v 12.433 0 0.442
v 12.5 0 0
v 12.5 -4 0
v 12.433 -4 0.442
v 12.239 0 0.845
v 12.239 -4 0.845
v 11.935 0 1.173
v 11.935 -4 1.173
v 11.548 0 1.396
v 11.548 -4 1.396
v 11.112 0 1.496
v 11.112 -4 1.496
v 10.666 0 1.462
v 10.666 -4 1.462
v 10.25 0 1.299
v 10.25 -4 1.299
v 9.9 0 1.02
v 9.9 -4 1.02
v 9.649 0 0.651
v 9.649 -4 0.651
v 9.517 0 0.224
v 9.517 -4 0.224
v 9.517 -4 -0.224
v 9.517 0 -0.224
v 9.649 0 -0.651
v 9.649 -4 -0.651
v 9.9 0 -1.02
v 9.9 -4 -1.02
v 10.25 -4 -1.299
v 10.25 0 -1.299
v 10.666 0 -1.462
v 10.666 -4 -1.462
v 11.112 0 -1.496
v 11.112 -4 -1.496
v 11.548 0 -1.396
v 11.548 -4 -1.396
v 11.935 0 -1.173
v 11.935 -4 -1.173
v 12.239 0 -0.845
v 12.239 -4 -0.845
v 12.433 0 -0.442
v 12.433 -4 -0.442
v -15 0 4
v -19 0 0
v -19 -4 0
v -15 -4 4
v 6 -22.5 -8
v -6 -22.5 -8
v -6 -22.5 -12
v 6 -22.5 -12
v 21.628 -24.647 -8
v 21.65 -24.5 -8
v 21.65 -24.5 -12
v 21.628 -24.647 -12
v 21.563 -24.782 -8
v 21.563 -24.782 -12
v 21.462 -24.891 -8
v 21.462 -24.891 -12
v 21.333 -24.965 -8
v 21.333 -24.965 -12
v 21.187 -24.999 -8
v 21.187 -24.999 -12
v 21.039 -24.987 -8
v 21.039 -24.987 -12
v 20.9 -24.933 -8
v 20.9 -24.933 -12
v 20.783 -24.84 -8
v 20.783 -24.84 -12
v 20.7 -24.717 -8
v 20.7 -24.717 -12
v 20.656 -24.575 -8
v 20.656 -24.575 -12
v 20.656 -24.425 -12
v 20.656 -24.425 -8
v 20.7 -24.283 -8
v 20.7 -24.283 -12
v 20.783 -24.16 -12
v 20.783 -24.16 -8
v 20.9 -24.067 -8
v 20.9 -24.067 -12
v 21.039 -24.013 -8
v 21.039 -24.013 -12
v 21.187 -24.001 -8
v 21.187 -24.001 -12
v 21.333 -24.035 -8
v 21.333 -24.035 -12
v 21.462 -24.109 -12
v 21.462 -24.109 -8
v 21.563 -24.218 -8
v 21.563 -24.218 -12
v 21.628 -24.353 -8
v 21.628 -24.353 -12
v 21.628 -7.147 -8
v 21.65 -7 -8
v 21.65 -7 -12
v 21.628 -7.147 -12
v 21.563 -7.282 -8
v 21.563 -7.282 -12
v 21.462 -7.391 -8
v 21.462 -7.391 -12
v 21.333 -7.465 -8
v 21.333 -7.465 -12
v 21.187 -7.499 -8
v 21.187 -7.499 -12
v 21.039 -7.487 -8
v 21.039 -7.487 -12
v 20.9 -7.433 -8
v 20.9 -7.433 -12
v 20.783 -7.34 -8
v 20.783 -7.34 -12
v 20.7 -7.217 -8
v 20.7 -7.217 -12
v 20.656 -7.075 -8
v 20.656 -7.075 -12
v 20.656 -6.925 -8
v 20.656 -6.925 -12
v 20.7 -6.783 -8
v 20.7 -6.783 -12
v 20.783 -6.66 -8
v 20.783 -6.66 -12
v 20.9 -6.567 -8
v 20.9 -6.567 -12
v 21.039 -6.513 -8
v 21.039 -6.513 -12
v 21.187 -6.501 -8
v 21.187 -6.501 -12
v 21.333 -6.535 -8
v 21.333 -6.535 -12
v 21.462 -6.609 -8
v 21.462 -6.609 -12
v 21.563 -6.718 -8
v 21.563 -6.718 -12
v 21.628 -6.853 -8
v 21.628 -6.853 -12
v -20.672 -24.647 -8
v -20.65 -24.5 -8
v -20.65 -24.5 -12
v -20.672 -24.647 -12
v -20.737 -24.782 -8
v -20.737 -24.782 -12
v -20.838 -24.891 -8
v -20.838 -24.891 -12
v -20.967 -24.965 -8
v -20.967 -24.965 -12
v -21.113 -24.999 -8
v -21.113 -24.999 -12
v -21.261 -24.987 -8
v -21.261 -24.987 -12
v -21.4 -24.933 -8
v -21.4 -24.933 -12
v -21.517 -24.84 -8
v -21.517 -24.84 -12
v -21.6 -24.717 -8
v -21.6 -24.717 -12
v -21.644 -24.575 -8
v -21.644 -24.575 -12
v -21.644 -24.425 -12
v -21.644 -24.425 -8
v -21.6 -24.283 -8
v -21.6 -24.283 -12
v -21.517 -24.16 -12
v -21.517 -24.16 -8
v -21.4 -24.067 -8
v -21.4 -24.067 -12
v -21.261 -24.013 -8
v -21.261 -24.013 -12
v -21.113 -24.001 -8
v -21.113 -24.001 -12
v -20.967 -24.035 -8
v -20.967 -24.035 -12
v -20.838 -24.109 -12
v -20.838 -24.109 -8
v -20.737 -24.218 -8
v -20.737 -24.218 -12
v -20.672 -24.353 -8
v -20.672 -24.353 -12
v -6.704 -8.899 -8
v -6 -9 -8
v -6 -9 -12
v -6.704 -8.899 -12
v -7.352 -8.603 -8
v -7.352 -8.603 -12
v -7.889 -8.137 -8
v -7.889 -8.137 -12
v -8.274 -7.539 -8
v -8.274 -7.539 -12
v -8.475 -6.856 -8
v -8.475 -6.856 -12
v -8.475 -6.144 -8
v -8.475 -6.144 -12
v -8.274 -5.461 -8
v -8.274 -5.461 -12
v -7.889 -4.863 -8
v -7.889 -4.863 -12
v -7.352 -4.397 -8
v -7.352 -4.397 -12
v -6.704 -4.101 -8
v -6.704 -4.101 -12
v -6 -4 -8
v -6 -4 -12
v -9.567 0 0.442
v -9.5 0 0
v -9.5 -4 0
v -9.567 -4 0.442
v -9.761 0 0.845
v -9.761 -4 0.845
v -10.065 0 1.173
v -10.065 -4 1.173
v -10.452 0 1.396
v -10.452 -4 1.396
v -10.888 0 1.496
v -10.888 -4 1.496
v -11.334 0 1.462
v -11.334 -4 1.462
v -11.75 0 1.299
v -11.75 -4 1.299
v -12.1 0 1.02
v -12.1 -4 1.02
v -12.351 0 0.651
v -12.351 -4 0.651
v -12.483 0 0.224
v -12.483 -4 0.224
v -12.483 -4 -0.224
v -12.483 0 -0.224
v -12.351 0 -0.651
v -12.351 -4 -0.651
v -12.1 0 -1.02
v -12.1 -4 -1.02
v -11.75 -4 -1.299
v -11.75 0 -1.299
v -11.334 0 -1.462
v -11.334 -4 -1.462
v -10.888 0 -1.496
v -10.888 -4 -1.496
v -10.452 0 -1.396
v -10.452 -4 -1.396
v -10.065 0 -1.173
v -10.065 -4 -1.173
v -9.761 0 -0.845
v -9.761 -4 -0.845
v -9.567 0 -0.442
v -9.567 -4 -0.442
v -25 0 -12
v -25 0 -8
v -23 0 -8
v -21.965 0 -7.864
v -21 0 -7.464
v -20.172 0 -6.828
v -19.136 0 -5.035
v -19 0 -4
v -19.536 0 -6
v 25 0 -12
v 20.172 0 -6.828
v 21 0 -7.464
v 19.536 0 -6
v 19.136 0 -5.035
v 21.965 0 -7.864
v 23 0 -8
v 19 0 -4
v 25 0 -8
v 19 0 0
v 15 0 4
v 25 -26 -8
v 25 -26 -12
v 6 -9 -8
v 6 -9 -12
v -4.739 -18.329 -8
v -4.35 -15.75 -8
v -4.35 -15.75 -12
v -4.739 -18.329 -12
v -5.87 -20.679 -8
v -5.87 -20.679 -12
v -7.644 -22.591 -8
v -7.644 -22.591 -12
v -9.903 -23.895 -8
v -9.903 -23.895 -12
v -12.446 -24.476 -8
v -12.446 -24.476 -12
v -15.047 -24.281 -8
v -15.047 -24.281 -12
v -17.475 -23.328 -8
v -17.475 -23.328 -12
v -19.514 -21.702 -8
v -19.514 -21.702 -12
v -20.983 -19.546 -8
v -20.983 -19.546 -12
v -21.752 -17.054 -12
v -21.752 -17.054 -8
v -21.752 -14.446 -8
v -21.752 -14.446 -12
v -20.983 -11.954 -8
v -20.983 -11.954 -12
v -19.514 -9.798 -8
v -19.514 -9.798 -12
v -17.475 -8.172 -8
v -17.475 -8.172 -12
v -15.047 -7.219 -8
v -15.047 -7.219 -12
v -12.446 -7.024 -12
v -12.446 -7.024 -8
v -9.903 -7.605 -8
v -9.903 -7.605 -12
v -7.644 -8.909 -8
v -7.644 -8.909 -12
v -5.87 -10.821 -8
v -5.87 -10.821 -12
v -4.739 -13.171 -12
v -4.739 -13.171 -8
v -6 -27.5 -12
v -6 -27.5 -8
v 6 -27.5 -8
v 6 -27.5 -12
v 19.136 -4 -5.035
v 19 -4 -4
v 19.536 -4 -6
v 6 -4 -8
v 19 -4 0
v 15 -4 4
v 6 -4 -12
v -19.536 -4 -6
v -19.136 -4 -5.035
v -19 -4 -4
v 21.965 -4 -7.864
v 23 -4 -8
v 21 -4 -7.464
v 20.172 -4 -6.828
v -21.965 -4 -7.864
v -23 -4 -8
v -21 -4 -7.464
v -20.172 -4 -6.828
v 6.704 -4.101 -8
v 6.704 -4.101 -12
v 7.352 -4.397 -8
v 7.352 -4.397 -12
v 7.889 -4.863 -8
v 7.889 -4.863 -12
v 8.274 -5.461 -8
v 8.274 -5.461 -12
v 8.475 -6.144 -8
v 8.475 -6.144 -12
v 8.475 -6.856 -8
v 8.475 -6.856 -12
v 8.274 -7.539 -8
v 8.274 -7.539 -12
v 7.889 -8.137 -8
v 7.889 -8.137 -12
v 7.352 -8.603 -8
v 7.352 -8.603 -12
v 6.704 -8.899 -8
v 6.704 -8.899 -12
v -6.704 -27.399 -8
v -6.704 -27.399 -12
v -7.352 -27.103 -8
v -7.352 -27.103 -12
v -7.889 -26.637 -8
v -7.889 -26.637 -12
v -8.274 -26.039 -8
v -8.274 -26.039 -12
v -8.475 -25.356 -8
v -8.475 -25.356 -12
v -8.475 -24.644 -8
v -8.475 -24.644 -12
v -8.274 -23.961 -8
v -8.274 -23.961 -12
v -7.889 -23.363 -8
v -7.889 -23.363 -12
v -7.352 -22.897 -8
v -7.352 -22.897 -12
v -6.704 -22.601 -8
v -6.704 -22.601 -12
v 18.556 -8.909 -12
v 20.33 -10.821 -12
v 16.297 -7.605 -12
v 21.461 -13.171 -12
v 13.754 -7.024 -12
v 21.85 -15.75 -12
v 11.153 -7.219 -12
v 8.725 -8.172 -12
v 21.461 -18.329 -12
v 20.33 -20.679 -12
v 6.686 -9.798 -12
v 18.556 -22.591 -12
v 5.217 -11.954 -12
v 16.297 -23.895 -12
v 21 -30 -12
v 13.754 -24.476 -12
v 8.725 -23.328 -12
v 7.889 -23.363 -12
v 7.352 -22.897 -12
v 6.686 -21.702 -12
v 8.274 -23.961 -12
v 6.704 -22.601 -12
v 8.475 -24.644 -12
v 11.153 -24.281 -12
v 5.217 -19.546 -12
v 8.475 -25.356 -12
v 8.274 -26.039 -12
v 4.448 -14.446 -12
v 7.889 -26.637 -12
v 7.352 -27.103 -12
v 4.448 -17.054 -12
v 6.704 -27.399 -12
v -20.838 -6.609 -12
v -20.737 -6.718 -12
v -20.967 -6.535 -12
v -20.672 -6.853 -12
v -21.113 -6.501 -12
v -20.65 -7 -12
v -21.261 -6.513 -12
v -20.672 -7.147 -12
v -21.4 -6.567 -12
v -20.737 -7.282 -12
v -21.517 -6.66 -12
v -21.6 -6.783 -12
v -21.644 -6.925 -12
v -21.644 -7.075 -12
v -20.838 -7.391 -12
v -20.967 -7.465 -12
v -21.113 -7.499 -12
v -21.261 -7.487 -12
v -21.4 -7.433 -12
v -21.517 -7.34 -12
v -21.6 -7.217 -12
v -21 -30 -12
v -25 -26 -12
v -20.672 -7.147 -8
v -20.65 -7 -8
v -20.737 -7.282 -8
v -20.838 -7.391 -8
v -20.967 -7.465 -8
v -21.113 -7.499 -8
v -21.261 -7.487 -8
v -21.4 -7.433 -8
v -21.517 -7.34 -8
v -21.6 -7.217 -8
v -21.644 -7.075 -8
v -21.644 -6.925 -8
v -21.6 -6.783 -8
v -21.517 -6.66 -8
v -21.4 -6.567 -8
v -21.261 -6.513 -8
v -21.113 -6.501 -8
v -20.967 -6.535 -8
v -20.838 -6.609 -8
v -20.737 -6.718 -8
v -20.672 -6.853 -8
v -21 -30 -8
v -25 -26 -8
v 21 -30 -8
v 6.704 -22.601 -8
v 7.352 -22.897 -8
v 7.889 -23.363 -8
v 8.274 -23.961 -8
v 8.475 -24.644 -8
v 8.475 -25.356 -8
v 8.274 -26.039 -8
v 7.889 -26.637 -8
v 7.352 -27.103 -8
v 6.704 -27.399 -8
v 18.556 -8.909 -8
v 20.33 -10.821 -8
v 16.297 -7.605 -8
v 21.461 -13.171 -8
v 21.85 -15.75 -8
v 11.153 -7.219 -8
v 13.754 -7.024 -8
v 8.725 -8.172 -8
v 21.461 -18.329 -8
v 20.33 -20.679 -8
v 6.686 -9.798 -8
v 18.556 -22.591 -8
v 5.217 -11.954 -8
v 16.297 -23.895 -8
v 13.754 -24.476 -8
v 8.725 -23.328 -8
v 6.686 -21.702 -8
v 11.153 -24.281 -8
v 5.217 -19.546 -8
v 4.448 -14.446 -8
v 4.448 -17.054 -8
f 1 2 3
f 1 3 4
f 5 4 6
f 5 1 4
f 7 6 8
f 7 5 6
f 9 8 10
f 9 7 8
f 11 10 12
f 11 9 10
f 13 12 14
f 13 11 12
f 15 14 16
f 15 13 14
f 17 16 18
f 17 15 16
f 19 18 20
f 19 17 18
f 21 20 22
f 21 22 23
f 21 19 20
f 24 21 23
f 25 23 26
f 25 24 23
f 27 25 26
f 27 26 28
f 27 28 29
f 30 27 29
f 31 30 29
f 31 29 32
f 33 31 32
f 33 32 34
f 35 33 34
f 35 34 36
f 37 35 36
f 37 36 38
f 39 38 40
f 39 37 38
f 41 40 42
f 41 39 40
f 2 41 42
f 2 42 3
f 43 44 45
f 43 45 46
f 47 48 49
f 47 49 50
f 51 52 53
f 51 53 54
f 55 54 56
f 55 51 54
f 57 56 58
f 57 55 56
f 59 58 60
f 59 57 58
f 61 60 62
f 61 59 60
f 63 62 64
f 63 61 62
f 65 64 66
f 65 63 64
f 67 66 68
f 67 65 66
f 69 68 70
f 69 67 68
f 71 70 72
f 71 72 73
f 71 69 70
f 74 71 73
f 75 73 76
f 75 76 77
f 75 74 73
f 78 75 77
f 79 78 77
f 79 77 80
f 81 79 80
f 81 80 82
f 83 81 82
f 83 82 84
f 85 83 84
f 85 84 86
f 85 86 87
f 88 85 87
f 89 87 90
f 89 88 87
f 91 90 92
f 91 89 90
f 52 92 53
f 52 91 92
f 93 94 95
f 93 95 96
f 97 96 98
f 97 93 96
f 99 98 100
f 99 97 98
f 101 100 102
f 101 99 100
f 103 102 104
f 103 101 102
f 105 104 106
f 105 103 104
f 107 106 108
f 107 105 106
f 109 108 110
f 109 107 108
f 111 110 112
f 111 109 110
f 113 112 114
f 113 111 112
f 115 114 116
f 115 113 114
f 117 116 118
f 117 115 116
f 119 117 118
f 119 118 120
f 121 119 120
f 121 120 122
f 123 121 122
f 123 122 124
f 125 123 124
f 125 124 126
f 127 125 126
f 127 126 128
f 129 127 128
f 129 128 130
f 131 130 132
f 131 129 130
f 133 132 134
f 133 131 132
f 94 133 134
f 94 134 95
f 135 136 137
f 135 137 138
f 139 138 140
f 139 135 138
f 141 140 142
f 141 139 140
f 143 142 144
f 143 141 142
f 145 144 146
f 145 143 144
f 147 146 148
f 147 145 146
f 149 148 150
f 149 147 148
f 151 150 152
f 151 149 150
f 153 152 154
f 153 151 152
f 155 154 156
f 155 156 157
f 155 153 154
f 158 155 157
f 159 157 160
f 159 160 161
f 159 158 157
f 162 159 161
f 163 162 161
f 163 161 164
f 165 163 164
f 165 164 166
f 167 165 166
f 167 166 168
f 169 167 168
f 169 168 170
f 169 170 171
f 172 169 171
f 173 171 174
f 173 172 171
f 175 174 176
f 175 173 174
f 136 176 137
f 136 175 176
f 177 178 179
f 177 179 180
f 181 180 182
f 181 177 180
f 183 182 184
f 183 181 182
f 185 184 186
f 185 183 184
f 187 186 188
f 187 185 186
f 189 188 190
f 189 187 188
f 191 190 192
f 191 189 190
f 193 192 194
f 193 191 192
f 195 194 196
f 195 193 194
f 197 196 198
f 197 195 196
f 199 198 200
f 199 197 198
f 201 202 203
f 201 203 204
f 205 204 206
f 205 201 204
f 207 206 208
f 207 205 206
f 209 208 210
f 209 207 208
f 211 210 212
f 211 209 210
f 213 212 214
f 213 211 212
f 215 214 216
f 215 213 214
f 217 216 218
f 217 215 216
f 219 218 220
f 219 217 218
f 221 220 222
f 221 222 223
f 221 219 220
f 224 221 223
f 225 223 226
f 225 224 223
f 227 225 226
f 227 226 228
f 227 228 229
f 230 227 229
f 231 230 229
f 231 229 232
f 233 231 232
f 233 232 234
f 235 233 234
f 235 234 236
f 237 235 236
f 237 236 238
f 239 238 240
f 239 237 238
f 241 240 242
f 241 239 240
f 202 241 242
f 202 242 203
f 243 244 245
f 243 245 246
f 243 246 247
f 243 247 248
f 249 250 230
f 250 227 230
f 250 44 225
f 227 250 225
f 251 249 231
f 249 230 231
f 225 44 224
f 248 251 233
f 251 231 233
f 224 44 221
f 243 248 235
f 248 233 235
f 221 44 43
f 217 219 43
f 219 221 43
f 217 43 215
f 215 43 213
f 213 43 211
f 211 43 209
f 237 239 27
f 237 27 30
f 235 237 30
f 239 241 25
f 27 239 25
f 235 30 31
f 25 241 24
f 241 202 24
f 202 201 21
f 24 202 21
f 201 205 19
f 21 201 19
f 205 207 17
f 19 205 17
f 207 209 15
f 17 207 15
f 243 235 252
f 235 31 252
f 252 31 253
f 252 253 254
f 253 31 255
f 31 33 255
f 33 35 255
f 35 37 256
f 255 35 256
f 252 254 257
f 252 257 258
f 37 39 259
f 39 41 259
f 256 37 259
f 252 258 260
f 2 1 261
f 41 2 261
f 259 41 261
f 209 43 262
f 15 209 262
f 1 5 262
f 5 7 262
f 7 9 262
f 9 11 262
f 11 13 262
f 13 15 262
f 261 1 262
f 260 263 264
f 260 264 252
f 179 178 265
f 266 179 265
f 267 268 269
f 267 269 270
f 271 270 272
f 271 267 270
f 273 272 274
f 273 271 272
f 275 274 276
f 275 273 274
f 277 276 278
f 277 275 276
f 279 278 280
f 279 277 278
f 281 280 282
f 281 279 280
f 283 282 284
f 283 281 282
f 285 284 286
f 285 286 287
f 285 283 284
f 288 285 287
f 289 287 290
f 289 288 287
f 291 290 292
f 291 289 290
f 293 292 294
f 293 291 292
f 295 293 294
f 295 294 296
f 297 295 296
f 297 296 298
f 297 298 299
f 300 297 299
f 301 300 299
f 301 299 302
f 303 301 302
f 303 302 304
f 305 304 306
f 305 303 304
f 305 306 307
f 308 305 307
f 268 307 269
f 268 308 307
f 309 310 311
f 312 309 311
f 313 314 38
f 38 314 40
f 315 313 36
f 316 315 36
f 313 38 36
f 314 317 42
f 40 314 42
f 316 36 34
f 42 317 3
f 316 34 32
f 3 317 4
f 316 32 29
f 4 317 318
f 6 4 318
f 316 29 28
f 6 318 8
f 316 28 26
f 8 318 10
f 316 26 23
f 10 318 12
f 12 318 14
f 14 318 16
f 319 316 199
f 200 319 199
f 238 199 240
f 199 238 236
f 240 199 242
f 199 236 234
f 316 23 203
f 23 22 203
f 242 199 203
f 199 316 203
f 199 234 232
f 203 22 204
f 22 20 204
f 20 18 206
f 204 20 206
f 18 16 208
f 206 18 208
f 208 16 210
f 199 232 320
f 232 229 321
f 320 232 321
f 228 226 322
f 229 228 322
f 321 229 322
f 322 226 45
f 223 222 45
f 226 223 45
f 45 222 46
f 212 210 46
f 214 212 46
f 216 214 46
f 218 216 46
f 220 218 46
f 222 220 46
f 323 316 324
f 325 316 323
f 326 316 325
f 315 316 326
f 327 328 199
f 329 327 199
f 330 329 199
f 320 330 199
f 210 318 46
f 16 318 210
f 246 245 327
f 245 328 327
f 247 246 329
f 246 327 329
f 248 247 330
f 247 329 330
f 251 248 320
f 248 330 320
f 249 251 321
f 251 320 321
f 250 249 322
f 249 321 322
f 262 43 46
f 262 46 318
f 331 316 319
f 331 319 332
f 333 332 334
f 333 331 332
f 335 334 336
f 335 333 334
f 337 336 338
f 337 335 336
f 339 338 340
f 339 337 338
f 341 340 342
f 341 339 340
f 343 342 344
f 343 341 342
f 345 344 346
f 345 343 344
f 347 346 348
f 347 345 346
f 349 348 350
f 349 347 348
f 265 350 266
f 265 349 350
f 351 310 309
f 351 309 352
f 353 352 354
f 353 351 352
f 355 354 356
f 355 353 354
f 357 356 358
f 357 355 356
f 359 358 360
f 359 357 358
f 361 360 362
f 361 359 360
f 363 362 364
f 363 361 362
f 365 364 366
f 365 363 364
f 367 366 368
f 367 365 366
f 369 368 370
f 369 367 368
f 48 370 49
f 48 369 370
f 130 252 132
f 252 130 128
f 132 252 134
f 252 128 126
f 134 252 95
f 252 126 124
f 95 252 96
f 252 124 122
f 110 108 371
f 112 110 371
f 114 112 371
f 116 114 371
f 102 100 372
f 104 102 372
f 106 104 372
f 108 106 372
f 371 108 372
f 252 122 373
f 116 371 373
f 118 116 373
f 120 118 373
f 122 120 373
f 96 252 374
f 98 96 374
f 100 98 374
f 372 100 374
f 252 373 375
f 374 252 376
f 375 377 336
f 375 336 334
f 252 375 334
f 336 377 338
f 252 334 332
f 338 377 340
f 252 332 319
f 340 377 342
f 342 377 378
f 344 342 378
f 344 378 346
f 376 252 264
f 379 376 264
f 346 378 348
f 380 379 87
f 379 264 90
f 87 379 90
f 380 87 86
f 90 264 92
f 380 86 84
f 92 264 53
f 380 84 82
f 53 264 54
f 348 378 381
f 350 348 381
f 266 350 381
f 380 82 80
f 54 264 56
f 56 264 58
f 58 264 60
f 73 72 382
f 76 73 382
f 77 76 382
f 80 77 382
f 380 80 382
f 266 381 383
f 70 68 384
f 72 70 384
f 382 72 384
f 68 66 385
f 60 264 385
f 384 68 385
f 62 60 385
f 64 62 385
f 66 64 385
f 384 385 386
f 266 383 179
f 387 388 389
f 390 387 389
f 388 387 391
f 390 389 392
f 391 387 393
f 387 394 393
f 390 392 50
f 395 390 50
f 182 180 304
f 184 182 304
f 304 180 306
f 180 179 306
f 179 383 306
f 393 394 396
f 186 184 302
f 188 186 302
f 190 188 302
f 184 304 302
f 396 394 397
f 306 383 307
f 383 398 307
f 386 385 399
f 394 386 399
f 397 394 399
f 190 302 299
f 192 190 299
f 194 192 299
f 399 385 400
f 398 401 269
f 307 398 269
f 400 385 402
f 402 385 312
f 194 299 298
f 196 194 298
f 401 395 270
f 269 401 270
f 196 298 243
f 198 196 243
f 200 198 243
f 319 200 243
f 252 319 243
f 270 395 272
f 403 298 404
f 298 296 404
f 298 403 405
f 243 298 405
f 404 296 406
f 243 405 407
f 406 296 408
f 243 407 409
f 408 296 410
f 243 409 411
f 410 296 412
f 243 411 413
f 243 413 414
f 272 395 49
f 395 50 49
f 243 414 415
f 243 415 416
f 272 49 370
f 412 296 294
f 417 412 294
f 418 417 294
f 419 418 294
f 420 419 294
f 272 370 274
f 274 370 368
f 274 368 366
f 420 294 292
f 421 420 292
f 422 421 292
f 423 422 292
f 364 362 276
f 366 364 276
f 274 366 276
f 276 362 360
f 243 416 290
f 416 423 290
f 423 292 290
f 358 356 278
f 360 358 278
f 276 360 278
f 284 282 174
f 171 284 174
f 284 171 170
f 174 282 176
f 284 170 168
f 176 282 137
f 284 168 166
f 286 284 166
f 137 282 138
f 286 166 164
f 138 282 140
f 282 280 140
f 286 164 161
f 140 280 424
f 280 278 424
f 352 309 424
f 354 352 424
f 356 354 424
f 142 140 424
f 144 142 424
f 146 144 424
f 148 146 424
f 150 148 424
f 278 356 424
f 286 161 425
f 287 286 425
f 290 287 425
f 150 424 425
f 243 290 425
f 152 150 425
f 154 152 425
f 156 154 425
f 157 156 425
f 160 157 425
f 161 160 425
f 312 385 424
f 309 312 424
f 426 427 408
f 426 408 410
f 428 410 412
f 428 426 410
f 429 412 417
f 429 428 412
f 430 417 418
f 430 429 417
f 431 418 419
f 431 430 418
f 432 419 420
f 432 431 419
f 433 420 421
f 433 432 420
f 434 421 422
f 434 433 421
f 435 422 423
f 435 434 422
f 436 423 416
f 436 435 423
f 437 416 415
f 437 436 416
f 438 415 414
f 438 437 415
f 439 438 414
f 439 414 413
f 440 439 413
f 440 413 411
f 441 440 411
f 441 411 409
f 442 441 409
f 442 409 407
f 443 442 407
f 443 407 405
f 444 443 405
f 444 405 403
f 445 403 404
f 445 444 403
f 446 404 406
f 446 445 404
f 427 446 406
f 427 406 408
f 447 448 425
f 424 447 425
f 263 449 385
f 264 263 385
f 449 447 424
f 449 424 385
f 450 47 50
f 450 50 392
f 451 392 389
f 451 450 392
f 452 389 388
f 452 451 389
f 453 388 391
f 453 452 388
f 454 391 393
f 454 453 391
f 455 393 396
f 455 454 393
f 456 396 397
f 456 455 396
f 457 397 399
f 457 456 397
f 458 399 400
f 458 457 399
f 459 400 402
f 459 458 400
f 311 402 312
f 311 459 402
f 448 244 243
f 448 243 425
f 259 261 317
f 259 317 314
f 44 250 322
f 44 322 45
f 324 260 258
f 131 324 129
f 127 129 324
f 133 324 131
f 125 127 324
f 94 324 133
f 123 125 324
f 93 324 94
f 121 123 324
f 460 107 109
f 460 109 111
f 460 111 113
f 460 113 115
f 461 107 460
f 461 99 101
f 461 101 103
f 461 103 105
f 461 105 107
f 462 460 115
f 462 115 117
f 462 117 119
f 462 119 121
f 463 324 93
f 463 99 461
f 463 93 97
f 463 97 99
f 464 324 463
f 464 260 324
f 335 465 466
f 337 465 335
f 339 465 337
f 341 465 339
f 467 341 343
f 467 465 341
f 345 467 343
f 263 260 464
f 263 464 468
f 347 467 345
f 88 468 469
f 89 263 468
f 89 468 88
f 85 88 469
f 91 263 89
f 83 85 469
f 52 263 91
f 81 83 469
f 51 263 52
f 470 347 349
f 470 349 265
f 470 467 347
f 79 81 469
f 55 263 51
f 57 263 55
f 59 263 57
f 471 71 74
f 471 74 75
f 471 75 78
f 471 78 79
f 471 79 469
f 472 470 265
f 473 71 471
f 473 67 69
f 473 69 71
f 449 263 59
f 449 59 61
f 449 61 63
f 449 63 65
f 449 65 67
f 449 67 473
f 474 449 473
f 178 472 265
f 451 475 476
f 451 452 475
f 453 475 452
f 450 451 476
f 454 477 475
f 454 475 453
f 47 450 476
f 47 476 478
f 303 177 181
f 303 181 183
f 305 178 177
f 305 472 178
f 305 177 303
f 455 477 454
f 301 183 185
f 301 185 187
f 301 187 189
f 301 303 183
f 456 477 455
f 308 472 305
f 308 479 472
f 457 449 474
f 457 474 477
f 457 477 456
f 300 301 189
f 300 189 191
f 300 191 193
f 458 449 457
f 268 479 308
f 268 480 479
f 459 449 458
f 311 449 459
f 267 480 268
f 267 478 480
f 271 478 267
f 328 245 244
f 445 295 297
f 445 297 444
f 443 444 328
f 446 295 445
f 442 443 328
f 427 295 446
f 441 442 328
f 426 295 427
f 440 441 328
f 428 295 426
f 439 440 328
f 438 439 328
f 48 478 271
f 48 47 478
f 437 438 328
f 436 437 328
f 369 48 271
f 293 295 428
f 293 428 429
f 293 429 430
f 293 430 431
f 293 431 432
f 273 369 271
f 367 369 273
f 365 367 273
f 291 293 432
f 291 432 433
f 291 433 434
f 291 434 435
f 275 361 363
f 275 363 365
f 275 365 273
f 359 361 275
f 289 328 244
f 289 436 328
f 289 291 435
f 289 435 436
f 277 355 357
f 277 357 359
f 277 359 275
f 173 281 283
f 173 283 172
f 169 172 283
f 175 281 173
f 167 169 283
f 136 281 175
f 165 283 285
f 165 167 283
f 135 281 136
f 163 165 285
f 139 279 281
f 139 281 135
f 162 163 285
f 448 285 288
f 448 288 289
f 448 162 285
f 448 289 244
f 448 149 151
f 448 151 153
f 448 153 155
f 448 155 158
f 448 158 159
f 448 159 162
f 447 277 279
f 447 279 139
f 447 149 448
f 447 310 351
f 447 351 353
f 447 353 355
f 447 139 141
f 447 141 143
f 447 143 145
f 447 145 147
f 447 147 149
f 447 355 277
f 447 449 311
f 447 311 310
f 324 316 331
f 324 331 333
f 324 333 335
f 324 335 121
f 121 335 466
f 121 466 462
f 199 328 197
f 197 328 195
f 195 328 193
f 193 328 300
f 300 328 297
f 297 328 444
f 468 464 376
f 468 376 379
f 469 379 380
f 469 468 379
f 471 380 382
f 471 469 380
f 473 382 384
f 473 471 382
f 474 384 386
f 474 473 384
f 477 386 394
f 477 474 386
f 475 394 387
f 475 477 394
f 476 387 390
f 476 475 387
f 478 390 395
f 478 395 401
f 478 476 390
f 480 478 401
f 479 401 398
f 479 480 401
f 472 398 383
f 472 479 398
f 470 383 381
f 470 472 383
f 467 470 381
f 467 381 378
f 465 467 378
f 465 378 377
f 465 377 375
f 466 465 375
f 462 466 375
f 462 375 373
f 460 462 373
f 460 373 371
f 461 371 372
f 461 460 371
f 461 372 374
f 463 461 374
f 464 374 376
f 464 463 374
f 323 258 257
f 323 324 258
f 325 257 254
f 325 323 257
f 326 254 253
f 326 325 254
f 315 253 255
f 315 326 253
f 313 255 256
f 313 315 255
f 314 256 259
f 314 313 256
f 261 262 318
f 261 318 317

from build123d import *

# Parameters (mm, degrees)
SKETCH_R             = 1.5
PAD_DEPTH            = 4
SKETCH001_R          = 0.5
SKETCH001_R_2        = 8.75
PAD001_DEPTH         = 4
FILLET_R             = 4
CHAMFER_SIZE         = 4
BODY_PLACEMENT_ANGLE = 90


with BuildPart() as part:
    # Sketch → Pad (new body)
    with BuildSketch(Plane.XY):
        Polygon((-15, 4), (15, 4), (19, 0), (19, -8), (-19, -8), (-19, 0), align=None)
        with Locations((-11, 0)):
            Circle(SKETCH_R, mode=Mode.SUBTRACT)
        with Locations((11, 0)):
            Circle(SKETCH_R, mode=Mode.SUBTRACT)
    extrude(amount=PAD_DEPTH)

    # Sketch001 (on Face2 of Pad) → Pad001 (join)
    with BuildSketch(Plane.XZ.offset(8)):
        Polygon((-25, 30), (25, 30), (25, 0), (0, 0), (-25, 0), align=None)
        with Locations((-21.15, 24.5)):
            Circle(SKETCH001_R, mode=Mode.SUBTRACT)
        with Locations((-21.15, 7)):
            Circle(SKETCH001_R, mode=Mode.SUBTRACT)
        with Locations((21.15, 7)):
            Circle(SKETCH001_R, mode=Mode.SUBTRACT)
        with Locations((21.15, 24.5)):
            Circle(SKETCH001_R, mode=Mode.SUBTRACT)
        with Locations((-13.1, 15.75)):
            Circle(SKETCH001_R_2, mode=Mode.SUBTRACT)
        with Locations((13.1, 15.75)):
            Circle(SKETCH001_R_2, mode=Mode.SUBTRACT)
        with BuildLine():
            Line((-6, 4), (0, 4))
            Line((6, 4), (0, 4))
            ThreePointArc((6, 4), (8.5, 6.5), (6, 9))
            Line((-6, 9), (6, 9))
            ThreePointArc((-6, 9), (-8.5, 6.5), (-6, 4))
        make_face(mode=Mode.SUBTRACT)
        with BuildLine():
            Line((-6, 27.5), (0, 27.5))
            Line((0, 27.5), (6, 27.5))
            ThreePointArc((6, 22.5), (8.5, 25), (6, 27.5))
            Line((-6, 22.5), (6, 22.5))
            ThreePointArc((-6, 27.5), (-8.5, 25), (-6, 22.5))
        make_face(mode=Mode.SUBTRACT)
    extrude(amount=PAD001_DEPTH)

    # Fillet
    fillet_edges = [part.edges().sort_by_distance(p)[0] for p in [
        (19, -8, 2),
        (-19, -8, 2),
    ]]
    fillet(fillet_edges, radius=FILLET_R)

    # Chamfer
    chamfer_edges = [part.edges().sort_by_distance(p)[0] for p in [
        (-25, -10, 30),
        (25, -10, 30),
    ]]
    chamfer(chamfer_edges, length=CHAMFER_SIZE)


with BuildPart() as part_1:
    # Body placement: moved
    add(part.part.rotate(Axis((0, 0, 0), (1, 0, 0)), BODY_PLACEMENT_ANGLE))


solid = part_1.part
